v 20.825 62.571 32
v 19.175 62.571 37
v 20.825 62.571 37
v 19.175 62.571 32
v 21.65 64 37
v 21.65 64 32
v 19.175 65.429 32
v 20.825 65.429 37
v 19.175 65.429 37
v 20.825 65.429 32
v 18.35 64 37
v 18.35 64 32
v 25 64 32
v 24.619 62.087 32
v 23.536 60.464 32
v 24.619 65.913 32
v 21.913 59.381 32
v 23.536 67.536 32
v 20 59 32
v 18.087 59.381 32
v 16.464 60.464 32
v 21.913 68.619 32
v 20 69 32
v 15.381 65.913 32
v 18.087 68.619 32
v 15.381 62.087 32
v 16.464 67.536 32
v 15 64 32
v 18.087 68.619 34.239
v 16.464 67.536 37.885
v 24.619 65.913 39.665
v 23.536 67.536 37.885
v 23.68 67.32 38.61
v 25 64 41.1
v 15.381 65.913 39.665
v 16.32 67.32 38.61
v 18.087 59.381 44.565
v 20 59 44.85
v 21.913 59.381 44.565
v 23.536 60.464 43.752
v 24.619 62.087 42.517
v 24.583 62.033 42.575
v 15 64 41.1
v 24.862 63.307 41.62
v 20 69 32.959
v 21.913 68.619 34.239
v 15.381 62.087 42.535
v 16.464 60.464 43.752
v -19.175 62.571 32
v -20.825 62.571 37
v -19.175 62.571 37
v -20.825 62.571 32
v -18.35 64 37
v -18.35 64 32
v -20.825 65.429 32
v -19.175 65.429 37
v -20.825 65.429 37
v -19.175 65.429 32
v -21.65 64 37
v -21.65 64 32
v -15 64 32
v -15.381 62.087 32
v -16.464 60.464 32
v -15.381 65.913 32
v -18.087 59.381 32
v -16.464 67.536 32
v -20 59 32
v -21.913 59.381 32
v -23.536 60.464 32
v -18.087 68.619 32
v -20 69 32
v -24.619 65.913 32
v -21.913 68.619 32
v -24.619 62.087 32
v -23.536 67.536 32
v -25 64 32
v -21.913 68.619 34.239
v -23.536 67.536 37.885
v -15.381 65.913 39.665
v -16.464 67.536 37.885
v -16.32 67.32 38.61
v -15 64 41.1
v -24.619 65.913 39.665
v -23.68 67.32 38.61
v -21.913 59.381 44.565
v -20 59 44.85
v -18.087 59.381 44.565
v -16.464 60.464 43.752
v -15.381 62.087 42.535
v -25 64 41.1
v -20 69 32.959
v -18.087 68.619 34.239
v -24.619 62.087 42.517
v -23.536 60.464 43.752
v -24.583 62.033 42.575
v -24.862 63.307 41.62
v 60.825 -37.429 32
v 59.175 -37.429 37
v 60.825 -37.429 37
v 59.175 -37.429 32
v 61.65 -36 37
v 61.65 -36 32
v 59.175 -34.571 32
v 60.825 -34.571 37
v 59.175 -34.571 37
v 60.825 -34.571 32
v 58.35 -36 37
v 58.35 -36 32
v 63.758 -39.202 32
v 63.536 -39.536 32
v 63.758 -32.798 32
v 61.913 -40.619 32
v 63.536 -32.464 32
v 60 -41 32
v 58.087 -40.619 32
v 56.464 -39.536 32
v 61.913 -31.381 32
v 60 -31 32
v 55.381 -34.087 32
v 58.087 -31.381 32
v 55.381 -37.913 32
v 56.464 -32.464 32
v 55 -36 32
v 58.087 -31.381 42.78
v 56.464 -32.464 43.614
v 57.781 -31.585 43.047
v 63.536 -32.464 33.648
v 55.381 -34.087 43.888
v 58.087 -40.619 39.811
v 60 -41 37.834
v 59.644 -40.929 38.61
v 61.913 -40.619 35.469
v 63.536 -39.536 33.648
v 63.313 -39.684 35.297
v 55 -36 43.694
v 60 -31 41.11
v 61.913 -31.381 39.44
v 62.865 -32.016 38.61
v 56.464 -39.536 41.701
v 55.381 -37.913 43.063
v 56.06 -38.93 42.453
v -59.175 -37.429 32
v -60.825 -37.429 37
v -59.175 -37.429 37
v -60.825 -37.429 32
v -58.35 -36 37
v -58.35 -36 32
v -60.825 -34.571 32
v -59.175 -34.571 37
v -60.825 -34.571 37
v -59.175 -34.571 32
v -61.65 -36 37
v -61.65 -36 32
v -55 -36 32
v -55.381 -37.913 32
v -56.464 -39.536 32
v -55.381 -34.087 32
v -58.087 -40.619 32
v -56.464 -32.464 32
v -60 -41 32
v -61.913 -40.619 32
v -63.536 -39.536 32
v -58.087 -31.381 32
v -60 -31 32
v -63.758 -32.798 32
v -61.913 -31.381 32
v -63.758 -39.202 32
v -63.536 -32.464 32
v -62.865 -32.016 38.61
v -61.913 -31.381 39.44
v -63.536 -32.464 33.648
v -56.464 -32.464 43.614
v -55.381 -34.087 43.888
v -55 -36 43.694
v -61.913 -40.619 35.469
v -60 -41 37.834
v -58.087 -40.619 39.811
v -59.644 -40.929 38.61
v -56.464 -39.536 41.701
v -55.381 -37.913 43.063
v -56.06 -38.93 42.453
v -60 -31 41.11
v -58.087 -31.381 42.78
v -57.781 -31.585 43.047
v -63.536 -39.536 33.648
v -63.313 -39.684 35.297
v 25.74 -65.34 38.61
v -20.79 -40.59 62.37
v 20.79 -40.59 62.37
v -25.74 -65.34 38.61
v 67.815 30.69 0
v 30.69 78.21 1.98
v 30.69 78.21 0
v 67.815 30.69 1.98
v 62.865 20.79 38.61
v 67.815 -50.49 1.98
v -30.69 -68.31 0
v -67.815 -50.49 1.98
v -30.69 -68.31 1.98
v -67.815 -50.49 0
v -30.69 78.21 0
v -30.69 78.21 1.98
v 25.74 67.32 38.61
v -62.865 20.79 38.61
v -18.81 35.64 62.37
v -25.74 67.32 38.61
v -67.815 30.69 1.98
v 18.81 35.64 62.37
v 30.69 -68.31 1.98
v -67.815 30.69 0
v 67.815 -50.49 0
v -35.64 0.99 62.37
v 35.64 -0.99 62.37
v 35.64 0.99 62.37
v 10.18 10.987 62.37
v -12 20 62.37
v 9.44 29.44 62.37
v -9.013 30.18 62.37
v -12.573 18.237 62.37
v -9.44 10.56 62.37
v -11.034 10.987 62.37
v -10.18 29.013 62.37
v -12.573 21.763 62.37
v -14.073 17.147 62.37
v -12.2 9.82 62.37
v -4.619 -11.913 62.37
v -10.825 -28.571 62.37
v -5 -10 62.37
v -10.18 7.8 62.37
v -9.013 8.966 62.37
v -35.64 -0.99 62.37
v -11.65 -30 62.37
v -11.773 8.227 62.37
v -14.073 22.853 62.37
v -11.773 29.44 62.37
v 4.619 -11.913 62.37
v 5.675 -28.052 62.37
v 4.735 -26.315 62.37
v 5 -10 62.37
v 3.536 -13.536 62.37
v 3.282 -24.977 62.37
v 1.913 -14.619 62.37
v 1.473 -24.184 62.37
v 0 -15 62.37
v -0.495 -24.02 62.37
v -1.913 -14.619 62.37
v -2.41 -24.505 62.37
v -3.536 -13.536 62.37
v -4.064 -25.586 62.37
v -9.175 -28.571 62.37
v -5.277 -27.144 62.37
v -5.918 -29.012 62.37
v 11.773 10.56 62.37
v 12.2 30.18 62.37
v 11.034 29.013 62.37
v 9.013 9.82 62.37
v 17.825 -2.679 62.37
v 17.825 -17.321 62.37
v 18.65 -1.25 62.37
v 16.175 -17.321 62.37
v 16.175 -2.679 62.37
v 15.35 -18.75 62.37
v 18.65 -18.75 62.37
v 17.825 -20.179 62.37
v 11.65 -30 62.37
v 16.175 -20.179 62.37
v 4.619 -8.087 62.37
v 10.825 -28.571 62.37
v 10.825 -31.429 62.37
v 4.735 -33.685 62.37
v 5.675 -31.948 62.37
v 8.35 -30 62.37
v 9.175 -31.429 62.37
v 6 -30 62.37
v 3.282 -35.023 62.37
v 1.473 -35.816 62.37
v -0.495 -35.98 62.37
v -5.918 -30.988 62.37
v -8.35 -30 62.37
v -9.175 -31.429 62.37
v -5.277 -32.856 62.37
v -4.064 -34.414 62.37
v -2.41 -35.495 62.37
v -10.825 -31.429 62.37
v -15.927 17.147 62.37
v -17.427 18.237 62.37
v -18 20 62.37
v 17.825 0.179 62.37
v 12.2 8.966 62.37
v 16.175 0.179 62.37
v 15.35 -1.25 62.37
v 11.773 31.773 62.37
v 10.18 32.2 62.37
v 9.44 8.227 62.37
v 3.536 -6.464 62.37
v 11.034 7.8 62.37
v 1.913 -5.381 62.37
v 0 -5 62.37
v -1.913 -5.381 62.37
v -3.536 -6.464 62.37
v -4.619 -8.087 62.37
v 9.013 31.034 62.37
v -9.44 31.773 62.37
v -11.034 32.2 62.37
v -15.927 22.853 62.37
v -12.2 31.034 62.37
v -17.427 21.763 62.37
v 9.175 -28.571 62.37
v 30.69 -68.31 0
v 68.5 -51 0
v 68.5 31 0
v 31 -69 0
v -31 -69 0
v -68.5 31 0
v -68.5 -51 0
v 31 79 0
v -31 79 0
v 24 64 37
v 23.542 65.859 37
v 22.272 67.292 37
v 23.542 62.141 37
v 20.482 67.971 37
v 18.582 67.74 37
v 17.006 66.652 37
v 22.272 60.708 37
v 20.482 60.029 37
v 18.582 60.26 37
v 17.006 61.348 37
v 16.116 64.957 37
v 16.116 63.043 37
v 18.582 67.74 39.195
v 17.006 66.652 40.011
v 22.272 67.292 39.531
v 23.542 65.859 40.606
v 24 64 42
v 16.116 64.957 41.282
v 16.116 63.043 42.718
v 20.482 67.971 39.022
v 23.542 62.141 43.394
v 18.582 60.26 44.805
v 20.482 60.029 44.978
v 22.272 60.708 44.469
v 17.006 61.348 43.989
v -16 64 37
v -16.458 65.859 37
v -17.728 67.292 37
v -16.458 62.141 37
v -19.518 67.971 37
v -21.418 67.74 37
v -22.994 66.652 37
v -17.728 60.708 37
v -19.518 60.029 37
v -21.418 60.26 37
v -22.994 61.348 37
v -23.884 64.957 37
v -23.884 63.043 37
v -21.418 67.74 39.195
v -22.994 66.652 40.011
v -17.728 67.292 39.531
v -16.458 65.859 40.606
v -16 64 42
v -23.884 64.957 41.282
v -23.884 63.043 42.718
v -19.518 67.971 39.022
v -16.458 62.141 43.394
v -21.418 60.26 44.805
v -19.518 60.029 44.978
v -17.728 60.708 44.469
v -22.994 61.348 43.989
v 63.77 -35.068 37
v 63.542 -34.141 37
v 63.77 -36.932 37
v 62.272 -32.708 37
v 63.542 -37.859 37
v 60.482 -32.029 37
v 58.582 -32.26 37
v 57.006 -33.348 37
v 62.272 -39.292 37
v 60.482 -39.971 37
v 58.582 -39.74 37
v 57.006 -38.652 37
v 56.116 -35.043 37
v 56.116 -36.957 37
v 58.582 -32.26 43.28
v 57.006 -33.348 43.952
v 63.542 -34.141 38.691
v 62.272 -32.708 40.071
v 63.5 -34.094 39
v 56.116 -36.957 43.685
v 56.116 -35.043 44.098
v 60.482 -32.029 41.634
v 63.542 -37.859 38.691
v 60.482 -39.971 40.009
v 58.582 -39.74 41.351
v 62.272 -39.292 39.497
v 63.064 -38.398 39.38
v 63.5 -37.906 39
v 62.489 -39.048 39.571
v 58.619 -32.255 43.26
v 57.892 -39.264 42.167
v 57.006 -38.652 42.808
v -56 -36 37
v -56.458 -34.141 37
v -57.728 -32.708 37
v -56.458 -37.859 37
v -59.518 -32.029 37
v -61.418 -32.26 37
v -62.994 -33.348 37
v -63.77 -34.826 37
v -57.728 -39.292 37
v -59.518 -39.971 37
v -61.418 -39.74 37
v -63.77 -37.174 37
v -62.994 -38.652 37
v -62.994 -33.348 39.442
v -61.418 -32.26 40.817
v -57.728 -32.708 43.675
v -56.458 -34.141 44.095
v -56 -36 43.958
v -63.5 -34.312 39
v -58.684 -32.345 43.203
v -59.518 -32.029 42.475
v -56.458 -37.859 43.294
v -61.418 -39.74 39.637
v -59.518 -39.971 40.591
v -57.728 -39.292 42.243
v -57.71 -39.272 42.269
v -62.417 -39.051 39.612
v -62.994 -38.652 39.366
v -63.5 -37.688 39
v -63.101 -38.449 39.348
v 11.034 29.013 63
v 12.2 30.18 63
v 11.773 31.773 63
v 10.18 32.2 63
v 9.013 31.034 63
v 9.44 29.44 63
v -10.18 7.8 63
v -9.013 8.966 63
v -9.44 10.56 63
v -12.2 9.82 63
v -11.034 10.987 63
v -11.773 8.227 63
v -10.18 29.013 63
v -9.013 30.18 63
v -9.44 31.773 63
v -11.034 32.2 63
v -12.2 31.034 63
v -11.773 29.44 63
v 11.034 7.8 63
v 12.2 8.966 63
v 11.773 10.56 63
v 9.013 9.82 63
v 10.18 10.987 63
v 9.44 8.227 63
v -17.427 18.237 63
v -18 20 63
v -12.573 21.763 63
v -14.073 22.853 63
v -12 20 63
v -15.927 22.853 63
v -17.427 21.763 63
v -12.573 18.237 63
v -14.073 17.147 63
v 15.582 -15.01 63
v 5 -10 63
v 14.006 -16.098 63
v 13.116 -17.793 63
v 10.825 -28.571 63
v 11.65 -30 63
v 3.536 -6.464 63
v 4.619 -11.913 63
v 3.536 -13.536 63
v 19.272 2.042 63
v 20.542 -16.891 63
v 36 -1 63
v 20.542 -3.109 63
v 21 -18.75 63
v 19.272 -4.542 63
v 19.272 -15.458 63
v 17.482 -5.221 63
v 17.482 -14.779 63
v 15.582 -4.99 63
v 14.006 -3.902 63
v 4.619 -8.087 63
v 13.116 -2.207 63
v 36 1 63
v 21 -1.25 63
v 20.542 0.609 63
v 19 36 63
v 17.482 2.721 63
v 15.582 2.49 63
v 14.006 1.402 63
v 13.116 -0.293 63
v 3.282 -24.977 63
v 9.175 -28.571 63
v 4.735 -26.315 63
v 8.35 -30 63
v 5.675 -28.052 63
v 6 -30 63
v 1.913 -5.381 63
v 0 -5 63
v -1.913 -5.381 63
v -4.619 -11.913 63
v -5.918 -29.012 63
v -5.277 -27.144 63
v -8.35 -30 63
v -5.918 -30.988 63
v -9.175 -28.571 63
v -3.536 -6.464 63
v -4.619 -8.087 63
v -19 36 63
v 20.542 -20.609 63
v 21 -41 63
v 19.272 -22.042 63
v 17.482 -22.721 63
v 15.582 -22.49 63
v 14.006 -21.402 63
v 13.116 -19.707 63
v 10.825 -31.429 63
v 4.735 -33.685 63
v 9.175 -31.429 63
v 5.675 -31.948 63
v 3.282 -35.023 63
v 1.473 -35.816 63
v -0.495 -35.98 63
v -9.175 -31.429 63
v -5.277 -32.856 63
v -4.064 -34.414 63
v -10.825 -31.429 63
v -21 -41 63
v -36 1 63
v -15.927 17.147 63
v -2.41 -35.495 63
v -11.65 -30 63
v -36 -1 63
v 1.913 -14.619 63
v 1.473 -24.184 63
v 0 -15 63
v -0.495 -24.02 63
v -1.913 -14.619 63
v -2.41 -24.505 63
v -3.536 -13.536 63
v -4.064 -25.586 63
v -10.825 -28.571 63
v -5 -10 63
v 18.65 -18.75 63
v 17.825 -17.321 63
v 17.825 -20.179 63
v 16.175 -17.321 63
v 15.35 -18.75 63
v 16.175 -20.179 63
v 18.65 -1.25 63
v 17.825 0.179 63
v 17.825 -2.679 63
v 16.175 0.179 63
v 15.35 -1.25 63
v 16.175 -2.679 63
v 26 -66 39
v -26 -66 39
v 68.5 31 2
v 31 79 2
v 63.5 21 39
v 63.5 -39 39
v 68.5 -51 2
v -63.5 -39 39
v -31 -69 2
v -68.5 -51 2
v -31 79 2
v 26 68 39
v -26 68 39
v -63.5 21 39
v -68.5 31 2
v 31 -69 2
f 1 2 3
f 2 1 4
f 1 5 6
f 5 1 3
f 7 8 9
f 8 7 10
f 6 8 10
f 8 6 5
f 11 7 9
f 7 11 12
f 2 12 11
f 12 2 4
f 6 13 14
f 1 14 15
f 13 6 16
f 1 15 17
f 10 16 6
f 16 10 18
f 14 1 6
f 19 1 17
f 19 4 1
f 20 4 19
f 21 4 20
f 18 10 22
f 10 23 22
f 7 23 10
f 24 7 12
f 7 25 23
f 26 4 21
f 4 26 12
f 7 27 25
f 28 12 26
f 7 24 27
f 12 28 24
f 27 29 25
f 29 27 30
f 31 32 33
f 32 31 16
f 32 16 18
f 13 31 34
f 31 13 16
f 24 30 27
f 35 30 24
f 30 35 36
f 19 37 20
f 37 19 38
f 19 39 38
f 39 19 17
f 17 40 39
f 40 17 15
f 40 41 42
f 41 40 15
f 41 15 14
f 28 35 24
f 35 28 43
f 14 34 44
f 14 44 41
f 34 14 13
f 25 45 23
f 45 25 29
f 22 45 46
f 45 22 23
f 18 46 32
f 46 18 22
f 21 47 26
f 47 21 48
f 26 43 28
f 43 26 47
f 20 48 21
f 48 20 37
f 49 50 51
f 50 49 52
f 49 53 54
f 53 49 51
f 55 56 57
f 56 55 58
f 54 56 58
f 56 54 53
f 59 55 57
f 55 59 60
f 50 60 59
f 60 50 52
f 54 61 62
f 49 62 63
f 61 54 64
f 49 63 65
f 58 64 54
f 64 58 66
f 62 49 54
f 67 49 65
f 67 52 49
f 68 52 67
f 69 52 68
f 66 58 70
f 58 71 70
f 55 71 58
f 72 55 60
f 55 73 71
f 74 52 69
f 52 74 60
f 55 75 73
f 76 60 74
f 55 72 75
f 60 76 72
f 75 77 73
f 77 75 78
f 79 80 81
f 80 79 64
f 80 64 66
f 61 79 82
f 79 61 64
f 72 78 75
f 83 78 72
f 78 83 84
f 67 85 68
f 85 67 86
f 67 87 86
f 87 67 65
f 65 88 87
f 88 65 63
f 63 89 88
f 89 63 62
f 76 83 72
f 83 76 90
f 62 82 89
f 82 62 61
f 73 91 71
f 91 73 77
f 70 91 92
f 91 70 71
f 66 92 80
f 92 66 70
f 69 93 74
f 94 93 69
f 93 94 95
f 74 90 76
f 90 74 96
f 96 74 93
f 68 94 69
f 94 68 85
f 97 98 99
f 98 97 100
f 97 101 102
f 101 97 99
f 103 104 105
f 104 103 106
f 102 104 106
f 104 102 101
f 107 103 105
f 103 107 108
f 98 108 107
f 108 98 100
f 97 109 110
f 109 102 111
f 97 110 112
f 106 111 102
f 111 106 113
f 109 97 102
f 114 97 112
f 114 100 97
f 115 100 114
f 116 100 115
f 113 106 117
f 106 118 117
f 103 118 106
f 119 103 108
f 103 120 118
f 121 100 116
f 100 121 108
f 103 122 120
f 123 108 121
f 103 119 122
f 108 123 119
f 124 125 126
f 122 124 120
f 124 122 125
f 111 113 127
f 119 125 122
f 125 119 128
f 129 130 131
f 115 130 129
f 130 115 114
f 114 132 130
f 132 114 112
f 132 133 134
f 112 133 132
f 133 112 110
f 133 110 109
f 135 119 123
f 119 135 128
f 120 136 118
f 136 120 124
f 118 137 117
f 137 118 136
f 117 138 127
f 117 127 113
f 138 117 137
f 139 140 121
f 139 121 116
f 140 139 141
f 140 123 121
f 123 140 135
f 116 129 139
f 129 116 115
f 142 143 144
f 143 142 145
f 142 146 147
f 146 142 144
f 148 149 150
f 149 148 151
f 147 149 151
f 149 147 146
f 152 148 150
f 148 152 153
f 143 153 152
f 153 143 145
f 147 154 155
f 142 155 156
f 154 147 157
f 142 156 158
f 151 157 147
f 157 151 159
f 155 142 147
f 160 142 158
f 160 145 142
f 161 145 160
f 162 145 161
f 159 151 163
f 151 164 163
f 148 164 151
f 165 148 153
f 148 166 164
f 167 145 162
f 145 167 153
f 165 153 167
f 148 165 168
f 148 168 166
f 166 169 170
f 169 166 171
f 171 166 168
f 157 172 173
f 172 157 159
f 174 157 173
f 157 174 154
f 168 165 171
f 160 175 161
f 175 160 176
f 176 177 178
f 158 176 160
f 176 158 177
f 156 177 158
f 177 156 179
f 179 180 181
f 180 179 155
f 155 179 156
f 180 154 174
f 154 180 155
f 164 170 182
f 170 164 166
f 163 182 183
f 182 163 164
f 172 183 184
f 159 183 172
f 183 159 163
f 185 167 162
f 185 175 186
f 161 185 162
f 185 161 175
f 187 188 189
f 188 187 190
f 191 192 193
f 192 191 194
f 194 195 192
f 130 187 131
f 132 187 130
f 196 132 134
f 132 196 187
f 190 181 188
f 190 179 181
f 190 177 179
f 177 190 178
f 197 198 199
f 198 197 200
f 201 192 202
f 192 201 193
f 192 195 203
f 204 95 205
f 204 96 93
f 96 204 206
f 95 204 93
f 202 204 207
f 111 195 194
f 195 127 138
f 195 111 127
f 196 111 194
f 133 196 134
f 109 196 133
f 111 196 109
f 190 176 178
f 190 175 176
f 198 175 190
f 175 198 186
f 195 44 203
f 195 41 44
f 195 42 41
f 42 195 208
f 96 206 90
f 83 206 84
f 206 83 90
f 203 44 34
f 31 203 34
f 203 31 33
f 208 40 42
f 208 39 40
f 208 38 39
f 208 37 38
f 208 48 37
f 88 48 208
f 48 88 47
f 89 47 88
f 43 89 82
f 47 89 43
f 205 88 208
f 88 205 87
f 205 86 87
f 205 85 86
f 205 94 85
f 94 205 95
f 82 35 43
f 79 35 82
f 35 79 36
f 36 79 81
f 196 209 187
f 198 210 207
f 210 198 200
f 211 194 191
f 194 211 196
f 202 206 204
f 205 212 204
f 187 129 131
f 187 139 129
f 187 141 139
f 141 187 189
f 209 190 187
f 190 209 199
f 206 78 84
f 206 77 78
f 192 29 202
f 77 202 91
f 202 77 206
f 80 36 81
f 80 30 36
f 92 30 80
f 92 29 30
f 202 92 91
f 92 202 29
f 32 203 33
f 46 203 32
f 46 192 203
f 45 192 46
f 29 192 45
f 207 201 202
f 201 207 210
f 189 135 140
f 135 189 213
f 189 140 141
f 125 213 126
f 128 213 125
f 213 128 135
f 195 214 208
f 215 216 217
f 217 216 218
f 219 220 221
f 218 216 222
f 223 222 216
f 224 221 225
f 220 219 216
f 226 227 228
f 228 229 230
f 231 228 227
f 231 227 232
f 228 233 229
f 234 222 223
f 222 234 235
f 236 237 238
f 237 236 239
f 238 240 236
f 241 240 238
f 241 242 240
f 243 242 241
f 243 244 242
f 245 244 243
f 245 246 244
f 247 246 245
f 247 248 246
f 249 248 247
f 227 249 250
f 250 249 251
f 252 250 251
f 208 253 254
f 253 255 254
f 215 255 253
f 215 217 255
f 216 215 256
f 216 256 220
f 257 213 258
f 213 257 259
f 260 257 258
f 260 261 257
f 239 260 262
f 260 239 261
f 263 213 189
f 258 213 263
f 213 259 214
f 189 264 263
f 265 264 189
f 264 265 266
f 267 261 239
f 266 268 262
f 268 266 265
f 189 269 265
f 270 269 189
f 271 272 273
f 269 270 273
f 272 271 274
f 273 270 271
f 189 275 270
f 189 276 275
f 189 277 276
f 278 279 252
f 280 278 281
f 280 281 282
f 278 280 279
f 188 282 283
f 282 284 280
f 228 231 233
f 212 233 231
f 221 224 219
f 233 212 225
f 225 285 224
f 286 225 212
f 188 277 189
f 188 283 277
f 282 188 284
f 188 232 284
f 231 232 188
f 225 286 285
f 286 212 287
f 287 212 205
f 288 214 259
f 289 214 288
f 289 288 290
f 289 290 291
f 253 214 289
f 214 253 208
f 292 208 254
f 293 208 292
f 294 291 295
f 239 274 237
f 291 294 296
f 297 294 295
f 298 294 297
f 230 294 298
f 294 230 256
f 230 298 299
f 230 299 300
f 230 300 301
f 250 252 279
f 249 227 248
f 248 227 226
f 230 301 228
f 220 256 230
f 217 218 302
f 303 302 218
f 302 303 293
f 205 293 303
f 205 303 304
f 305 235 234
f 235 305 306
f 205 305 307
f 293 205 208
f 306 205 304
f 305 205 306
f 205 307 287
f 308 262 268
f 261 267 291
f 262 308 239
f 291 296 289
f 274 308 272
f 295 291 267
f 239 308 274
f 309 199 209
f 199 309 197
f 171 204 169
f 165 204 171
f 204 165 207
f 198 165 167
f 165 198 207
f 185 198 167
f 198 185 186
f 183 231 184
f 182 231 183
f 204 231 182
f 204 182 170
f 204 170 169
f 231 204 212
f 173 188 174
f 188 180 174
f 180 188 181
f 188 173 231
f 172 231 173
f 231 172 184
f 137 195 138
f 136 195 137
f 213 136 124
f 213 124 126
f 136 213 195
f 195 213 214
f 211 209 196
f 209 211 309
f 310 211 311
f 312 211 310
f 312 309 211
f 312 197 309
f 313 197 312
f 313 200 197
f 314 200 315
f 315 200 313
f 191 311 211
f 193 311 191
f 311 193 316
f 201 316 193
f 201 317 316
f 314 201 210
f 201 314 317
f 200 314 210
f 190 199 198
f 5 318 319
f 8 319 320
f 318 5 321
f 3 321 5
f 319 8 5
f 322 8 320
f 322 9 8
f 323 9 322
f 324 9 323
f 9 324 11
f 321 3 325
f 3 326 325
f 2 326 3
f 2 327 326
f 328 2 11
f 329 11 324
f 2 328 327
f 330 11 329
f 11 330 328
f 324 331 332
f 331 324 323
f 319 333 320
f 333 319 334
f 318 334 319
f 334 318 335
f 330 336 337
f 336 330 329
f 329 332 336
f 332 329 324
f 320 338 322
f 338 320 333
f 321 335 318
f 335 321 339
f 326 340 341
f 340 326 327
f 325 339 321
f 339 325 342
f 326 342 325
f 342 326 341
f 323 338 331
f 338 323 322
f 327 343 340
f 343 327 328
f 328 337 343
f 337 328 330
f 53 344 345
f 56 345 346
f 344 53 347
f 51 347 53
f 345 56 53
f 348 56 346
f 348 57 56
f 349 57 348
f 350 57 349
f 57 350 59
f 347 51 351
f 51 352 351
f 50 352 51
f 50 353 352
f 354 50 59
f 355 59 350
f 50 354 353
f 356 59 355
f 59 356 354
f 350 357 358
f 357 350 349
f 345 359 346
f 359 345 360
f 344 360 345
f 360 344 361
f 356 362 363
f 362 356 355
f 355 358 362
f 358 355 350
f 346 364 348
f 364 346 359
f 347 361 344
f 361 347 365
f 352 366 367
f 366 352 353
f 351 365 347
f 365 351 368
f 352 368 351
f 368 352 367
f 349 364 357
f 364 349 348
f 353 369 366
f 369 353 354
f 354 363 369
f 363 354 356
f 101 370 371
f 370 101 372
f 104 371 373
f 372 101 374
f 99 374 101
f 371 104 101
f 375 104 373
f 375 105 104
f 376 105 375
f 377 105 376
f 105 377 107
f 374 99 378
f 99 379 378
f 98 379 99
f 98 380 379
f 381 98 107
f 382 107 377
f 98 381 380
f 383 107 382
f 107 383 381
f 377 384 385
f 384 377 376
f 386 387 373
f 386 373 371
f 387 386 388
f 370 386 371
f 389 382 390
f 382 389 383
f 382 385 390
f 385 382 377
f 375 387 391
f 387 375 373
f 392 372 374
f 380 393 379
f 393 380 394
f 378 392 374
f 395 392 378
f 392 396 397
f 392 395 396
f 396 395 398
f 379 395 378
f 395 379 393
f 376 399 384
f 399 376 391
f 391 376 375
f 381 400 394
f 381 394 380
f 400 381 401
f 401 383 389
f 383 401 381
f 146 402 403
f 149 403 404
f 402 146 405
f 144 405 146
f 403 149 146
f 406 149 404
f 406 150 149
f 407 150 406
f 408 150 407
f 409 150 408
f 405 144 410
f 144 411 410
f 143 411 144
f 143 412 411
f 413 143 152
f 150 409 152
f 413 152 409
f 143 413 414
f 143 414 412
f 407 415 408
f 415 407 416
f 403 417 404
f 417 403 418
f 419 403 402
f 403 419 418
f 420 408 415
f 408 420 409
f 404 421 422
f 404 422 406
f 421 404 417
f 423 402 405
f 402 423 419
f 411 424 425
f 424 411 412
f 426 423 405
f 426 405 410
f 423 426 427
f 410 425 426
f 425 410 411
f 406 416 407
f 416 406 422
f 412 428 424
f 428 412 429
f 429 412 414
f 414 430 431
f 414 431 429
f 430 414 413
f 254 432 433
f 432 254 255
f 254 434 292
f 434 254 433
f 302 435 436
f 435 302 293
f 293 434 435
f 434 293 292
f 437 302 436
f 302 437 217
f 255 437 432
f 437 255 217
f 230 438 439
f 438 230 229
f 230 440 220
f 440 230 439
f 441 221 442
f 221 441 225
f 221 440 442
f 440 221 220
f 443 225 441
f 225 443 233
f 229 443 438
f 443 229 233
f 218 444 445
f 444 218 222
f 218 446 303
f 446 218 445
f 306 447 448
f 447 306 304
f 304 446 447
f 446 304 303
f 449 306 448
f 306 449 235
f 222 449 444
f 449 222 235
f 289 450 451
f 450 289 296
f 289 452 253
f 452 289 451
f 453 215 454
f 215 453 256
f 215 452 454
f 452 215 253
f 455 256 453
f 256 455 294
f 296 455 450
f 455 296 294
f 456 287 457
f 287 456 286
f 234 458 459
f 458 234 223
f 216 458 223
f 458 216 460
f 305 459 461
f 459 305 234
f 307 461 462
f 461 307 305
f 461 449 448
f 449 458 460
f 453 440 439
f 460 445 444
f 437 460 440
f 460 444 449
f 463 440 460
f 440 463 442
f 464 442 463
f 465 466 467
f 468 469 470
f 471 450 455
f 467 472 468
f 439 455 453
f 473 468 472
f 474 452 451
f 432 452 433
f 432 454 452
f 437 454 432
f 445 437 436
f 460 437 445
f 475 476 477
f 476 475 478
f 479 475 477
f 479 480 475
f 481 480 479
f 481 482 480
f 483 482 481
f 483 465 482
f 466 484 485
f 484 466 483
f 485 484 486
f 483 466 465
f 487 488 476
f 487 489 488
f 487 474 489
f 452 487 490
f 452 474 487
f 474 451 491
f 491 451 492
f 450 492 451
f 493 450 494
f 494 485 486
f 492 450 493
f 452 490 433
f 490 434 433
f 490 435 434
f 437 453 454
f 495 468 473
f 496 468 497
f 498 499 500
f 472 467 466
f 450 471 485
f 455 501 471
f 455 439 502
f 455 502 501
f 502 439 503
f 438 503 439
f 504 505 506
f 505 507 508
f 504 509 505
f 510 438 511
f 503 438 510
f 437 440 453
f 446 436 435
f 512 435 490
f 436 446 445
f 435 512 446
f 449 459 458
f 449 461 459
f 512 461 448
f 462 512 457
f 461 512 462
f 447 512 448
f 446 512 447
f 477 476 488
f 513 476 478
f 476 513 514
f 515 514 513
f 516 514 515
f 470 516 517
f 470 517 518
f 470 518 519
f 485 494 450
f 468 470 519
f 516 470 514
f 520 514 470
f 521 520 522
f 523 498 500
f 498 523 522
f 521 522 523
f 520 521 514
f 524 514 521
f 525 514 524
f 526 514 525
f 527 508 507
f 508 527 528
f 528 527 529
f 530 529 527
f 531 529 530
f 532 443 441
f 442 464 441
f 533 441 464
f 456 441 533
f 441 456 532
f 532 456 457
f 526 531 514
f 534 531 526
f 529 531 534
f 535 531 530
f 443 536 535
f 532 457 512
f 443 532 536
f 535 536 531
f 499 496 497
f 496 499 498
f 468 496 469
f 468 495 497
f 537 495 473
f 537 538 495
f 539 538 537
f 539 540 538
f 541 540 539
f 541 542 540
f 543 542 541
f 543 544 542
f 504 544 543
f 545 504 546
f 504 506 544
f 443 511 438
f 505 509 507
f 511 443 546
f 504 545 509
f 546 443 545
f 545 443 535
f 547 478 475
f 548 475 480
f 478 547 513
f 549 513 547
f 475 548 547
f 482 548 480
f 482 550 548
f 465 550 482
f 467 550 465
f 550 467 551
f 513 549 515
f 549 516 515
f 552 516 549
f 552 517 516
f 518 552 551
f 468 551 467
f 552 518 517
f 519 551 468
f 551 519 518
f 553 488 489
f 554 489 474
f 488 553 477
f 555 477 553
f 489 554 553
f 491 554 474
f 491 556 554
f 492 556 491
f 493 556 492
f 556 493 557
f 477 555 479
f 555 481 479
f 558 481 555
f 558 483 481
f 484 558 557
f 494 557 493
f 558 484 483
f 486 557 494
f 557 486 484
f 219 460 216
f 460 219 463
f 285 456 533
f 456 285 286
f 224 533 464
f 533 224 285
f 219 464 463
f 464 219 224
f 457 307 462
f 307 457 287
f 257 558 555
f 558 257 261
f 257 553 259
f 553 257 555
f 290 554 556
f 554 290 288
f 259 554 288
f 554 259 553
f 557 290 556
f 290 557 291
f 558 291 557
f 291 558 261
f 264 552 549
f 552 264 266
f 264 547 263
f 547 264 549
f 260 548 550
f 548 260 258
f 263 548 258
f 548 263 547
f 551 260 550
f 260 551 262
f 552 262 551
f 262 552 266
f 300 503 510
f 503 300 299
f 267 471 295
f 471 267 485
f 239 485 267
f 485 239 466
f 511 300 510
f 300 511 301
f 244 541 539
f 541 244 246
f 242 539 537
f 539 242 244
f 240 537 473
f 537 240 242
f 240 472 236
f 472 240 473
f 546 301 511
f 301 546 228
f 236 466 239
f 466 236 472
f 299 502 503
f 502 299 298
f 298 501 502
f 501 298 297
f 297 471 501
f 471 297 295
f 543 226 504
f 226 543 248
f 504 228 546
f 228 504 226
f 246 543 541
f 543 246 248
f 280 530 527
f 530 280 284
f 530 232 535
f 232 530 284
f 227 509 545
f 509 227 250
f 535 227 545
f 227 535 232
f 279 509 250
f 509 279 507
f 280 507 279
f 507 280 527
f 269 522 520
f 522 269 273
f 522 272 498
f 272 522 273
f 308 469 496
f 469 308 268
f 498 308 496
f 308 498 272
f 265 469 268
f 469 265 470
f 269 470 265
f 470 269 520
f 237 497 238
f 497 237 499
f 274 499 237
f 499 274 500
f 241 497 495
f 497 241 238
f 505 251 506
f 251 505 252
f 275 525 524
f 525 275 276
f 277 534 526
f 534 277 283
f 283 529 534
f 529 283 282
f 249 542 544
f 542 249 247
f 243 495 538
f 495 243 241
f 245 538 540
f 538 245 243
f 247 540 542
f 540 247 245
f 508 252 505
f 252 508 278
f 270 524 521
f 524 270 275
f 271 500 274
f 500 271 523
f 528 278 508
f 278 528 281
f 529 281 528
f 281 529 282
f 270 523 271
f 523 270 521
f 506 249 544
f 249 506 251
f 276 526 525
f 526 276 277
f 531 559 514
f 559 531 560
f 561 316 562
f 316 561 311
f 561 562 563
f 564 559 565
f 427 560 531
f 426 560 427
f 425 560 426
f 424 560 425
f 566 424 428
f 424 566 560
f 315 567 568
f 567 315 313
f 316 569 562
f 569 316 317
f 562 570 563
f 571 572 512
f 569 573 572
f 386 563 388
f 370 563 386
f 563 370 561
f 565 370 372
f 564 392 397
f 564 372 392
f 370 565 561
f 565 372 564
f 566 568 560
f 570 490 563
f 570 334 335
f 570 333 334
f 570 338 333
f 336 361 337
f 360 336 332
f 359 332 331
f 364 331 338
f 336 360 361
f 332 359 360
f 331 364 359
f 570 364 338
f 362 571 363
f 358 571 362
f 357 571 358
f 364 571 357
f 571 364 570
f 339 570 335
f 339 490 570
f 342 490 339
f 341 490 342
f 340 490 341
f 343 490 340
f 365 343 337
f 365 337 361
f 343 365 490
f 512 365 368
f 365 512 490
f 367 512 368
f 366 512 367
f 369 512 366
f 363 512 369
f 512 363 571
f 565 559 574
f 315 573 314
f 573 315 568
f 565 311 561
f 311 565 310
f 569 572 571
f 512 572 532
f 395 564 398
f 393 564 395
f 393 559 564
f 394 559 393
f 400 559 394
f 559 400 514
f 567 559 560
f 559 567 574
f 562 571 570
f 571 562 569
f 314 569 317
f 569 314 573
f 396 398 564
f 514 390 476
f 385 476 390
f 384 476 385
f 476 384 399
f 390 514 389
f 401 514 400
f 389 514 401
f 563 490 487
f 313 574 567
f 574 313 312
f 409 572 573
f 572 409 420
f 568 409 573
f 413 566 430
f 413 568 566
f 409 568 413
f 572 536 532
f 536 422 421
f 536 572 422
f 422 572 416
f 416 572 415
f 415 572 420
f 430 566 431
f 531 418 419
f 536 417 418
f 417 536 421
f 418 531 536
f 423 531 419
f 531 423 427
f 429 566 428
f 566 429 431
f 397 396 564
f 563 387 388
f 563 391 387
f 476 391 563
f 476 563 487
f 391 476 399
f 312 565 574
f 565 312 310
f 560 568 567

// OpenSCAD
// file: frsky.scad
antenna_pair_mount();

module frsky_2_4ghz_antenna()
{
    translate([0,25,0]) cube([10,50,6],true);
}

module antenna_pair()
{
    rotate([0,0,45]) translate([0,5,0]) frsky_2_4ghz_antenna();
    rotate([0,90,-45]) translate([0,5,0]) frsky_2_4ghz_antenna();
}

module cable_clearance()
{
    rotate([0,0,45]) translate([0,25,0]) cube([2,50,10],true);
    rotate([0,0,-45]) translate([0,25,0]) cube([2,50,10],true);
}

module antenna_pair_mount()
{
    rotate([90,0,0])
    difference()
    {
        translate([0,6,0]) cube([23,12,12],true);
        #translate([0,0,2]) cable_clearance();
        #antenna_pair();
    }
    
}
// file: basic_fixings.scad
module Nut(width,thickness){
    translate([-width/2,-width/2,0]) cube([width,width,thickness]);
}

module NutSideAccess(nut_width,y,nut_thickness){
    // to allow depth for the hex nut in the slot, we multiply the width of the nut by the ratio here. Half of this is used to account for the depth in the hole. This is needed because hex nuts will sit on a point in the slot with two flat faces against the sides
    ratio = 1.15;
    depth = nut_width * ratio / 2;
    translate([-nut_width/2,-depth,0]) cube([nut_width,y+depth,nut_thickness]);
}

module Bolt(shaft_dia,head_dia,length,head_depth){
    cylinder(d=shaft_dia,h=length);
    translate([0,0,length]) cylinder(d=head_dia,h=head_depth);
}

module angle_bolt_boss(face_angle,bolt_shaft_dia,bolt_head_dia,bolt_length,head_depth,nut_width,nut_thickness){
    difference(){
        cube([15,20,15]);
        rotate([face_angle,0,0]) cube([30,30,30]);
        translate([7.5,10,8]) rotate([face_angle,0,0]) union(){
            Nut(nut_width,nut_thickness);
            translate([0,0,-5]) Bolt(bolt_shaft_dia,bolt_head_dia,bolt_length,head_depth);
            NutSideAccess(nut_width,20,nut_thickness);
        }
    }
}

angle_bolt_boss(face_angle=65,bolt_shaft_dia=3.6,bolt_head_dia=6.5,bolt_length=20,head_depth=3.5,nut_width=6.6,nut_thickness=2.5);
// main file
/*
This cover fits 4 mounting holes on the X650F-V4 frame

and is overall 138*144 mm with radiused corners
*/


use <basic_fixings.scad>
use <frsky.scad>
/*
body_base_layer();
translate([0,0,20]) body_mid_layer();
translate([0,0,30]) body_top_layer();
*/
top();

//#electronics_model();
//6#deck_model();

module deck_model()
{
    translate([-65,-40,15])
    {        
        translate([0,0,1]) cube([130,65,2]);
        translate([(130-50)/2,65,1]) cube([50,47,2]);
    }
}

module electronics_model()
{
    // px4 approximation, don't forget cable clearance at the rear and top
    translate([0,0,9]) cube([50,82,18], true);
    
    // frsky radio RX
    translate([44,0,7.5]) cube([30,50,15], true);
    
}

module gps_mast_mounting()
{
    // four bolt holes, on an X pattern
    rotate([0,0,45])
    {
        translate([15,0,-8]) Bolt(shaft_dia=3.3,head_dia=8,length=10,head_depth=2);
        translate([-15,0,-8]) Bolt(shaft_dia=3.3,head_dia=8,length=10,head_depth=2);
        translate([0,15,-8]) Bolt(shaft_dia=3.3,head_dia=8,length=10,head_depth=2);
        translate([0,-15,-8]) Bolt(shaft_dia=3.3,head_dia=8,length=10,head_depth=2);
    }
    // cable entry
    translate([-15,0,-6]) cylinder(d=6,h=6);
}

module safety_button_mounting()
{
    // rectangular PCB with button
    // this is a stupid board, with two mounting holes on one end
    translate([0,0,-8]) cylinder(d=10,h=10);
    translate([17,8.75,-10]) Bolt(shaft_dia=3.3,head_dia=8,length=10,head_depth=2);
    translate([17,-8.75,-10]) Bolt(shaft_dia=3.3,head_dia=8,length=10,head_depth=2);
}

module mountings_model()
{
    // this module describes the mountings on the quad frame, the bolts are delibrately specified
    // with "tall heads" to create the clearance above the fastening plane
    x1 = 20;
    y1 = 64;
    translate([x1,y1,-10]) Bolt(shaft_dia=3.3,head_dia=8,length=10,head_depth=100);
    translate([-x1,y1,-10]) Bolt(shaft_dia=3.3,head_dia=8,length=10,head_depth=100);
    
    x2 = 60;
    y2 = -36;
    translate([x2,y2,-10]) Bolt(shaft_dia=3.3,head_dia=8,length=10,head_depth=100);
    translate([-x2,y2,-10]) Bolt(shaft_dia=3.3,head_dia=8,length=10,head_depth=100);
}
module mountings_model_relief()
{
    // essentially the same model as above but with sizes tweaked to make clearance for wall thickness
    x1 = 20;
    y1 = 64;
    translate([x1,y1,-5]) Bolt(shaft_dia=3.3,head_dia=10,length=5,head_depth=100);
    translate([-x1,y1,-5]) Bolt(shaft_dia=3.3,head_dia=10,length=5,head_depth=100);
    
    x2 = 60;
    y2 = -36;
    translate([x2,y2,-5]) Bolt(shaft_dia=3.3,head_dia=10,length=5,head_depth=100);
    translate([-x2,y2,-5]) Bolt(shaft_dia=3.3,head_dia=10,length=5,head_depth=100);
}

module body_base_layer()
{
    width=135;
    length=145;
    frontX = 30; // half the width
    frontY = 78; // distance from centre line
    translate([frontX,frontY,1]) cube([2,2,2],true);
    translate([-frontX,frontY,1]) cube([2,2,2],true);

    midX = width/2; // half the width
    midY = 30; // distance from centre line
    translate([midX,midY,1]) cube([2,2,2],true);
    translate([-midX,midY,1]) cube([2,2,2],true);

    midX2 = width/2; // half the width
    midY2 = -50; // distance from centre line
    translate([midX2,midY2,1]) cube([2,2,2],true);
    translate([-midX2,midY2,1]) cube([2,2,2],true);

    rearX = 30; // half the width
    rearY = -68; // distance from centre line
    translate([rearX,rearY,1]) cube([2,2,2],true);
    translate([-rearX,rearY,1]) cube([2,2,2],true);

}

module body_mid_layer()
{
    width=135;
    frontX = 25; // half the width
    frontY = 67; // distance from centre line
    translate([frontX,frontY,1]) cube([2,2,2],true);
    translate([-frontX,frontY,1]) cube([2,2,2],true);

    midX = width/2 - 5; // half the width
    midY = 20; // distance from centre line
    translate([midX,midY,1]) cube([2,2,2],true);
    translate([-midX,midY,1]) cube([2,2,2],true);

    midX2 = width/2 -5; // half the width
    midY2 = -38; // distance from centre line
    translate([midX2,midY2,1]) cube([2,2,2],true);
    translate([-midX2,midY2,1]) cube([2,2,2],true);

    rearX = 25; // half the width
    rearY = -65; // distance from centre line
    translate([rearX,rearY,1]) cube([2,2,2],true);
    translate([-rearX,rearY,1]) cube([2,2,2],true);

}

module body_top_layer()
{
    x2 = 18;
    y2 = 35;
    translate([x2,y2,0]) cube([2,2,2],true);
    translate([-x2,y2,0]) cube([2,2,2],true);

    x3 = 35;
    y3 = 0;
    translate([x3,y3,0]) cube([2,2,2],true);
    translate([-x3,y3,0]) cube([2,2,2],true);

    x4 = 20;
    y4 = -40;
    translate([x4,y4,0]) cube([2,2,2],true);
    translate([-x4,y4,0]) cube([2,2,2],true);
}

module body_relief()
{
    // this needs to also model the wall thickness of the recessed mounting features
    difference()
    {
        scale([0.99,0.99,0.99])
        {
            hull()
            {
                #body_base_layer();
                #translate([0,0,20 + 17]) body_mid_layer();
                #translate([0,0,45 + 17]) body_top_layer();
            }
        }
        // some clearance model for the walls of recesses go here
        translate([0,0,15 + 17]) mountings_model_relief();
    }
}

module body()
{
    hull()
    {
        #body_base_layer();
        #translate([0,0,20 + 17]) body_mid_layer();
        #translate([0,0,45 + 17]) body_top_layer();
    }
}

module top()
{
    difference()
    {
        body();
        body_relief();

        #translate([0,0,20 + 17]) mountings_model();
        #translate([0,20,46 + 17]) gps_mast_mounting();
        #translate([0,-10,46 + 17]) safety_button_mounting();
        
        #translate([0,-30,40 + 17]) antenna_mounting();

    }
}

module antenna_mounting()
{
    // antenna installation hole, to allow feeding through from below
    cylinder(r=6,h=10);
    translate([-10,0,8]) rotate([0,180,0]) Bolt(shaft_dia=3.3,head_dia=8,length=6,head_depth=2);
    translate([10,0,8]) rotate([0,180,0]) Bolt(shaft_dia=3.3,head_dia=8,length=6,head_depth=2);
}
